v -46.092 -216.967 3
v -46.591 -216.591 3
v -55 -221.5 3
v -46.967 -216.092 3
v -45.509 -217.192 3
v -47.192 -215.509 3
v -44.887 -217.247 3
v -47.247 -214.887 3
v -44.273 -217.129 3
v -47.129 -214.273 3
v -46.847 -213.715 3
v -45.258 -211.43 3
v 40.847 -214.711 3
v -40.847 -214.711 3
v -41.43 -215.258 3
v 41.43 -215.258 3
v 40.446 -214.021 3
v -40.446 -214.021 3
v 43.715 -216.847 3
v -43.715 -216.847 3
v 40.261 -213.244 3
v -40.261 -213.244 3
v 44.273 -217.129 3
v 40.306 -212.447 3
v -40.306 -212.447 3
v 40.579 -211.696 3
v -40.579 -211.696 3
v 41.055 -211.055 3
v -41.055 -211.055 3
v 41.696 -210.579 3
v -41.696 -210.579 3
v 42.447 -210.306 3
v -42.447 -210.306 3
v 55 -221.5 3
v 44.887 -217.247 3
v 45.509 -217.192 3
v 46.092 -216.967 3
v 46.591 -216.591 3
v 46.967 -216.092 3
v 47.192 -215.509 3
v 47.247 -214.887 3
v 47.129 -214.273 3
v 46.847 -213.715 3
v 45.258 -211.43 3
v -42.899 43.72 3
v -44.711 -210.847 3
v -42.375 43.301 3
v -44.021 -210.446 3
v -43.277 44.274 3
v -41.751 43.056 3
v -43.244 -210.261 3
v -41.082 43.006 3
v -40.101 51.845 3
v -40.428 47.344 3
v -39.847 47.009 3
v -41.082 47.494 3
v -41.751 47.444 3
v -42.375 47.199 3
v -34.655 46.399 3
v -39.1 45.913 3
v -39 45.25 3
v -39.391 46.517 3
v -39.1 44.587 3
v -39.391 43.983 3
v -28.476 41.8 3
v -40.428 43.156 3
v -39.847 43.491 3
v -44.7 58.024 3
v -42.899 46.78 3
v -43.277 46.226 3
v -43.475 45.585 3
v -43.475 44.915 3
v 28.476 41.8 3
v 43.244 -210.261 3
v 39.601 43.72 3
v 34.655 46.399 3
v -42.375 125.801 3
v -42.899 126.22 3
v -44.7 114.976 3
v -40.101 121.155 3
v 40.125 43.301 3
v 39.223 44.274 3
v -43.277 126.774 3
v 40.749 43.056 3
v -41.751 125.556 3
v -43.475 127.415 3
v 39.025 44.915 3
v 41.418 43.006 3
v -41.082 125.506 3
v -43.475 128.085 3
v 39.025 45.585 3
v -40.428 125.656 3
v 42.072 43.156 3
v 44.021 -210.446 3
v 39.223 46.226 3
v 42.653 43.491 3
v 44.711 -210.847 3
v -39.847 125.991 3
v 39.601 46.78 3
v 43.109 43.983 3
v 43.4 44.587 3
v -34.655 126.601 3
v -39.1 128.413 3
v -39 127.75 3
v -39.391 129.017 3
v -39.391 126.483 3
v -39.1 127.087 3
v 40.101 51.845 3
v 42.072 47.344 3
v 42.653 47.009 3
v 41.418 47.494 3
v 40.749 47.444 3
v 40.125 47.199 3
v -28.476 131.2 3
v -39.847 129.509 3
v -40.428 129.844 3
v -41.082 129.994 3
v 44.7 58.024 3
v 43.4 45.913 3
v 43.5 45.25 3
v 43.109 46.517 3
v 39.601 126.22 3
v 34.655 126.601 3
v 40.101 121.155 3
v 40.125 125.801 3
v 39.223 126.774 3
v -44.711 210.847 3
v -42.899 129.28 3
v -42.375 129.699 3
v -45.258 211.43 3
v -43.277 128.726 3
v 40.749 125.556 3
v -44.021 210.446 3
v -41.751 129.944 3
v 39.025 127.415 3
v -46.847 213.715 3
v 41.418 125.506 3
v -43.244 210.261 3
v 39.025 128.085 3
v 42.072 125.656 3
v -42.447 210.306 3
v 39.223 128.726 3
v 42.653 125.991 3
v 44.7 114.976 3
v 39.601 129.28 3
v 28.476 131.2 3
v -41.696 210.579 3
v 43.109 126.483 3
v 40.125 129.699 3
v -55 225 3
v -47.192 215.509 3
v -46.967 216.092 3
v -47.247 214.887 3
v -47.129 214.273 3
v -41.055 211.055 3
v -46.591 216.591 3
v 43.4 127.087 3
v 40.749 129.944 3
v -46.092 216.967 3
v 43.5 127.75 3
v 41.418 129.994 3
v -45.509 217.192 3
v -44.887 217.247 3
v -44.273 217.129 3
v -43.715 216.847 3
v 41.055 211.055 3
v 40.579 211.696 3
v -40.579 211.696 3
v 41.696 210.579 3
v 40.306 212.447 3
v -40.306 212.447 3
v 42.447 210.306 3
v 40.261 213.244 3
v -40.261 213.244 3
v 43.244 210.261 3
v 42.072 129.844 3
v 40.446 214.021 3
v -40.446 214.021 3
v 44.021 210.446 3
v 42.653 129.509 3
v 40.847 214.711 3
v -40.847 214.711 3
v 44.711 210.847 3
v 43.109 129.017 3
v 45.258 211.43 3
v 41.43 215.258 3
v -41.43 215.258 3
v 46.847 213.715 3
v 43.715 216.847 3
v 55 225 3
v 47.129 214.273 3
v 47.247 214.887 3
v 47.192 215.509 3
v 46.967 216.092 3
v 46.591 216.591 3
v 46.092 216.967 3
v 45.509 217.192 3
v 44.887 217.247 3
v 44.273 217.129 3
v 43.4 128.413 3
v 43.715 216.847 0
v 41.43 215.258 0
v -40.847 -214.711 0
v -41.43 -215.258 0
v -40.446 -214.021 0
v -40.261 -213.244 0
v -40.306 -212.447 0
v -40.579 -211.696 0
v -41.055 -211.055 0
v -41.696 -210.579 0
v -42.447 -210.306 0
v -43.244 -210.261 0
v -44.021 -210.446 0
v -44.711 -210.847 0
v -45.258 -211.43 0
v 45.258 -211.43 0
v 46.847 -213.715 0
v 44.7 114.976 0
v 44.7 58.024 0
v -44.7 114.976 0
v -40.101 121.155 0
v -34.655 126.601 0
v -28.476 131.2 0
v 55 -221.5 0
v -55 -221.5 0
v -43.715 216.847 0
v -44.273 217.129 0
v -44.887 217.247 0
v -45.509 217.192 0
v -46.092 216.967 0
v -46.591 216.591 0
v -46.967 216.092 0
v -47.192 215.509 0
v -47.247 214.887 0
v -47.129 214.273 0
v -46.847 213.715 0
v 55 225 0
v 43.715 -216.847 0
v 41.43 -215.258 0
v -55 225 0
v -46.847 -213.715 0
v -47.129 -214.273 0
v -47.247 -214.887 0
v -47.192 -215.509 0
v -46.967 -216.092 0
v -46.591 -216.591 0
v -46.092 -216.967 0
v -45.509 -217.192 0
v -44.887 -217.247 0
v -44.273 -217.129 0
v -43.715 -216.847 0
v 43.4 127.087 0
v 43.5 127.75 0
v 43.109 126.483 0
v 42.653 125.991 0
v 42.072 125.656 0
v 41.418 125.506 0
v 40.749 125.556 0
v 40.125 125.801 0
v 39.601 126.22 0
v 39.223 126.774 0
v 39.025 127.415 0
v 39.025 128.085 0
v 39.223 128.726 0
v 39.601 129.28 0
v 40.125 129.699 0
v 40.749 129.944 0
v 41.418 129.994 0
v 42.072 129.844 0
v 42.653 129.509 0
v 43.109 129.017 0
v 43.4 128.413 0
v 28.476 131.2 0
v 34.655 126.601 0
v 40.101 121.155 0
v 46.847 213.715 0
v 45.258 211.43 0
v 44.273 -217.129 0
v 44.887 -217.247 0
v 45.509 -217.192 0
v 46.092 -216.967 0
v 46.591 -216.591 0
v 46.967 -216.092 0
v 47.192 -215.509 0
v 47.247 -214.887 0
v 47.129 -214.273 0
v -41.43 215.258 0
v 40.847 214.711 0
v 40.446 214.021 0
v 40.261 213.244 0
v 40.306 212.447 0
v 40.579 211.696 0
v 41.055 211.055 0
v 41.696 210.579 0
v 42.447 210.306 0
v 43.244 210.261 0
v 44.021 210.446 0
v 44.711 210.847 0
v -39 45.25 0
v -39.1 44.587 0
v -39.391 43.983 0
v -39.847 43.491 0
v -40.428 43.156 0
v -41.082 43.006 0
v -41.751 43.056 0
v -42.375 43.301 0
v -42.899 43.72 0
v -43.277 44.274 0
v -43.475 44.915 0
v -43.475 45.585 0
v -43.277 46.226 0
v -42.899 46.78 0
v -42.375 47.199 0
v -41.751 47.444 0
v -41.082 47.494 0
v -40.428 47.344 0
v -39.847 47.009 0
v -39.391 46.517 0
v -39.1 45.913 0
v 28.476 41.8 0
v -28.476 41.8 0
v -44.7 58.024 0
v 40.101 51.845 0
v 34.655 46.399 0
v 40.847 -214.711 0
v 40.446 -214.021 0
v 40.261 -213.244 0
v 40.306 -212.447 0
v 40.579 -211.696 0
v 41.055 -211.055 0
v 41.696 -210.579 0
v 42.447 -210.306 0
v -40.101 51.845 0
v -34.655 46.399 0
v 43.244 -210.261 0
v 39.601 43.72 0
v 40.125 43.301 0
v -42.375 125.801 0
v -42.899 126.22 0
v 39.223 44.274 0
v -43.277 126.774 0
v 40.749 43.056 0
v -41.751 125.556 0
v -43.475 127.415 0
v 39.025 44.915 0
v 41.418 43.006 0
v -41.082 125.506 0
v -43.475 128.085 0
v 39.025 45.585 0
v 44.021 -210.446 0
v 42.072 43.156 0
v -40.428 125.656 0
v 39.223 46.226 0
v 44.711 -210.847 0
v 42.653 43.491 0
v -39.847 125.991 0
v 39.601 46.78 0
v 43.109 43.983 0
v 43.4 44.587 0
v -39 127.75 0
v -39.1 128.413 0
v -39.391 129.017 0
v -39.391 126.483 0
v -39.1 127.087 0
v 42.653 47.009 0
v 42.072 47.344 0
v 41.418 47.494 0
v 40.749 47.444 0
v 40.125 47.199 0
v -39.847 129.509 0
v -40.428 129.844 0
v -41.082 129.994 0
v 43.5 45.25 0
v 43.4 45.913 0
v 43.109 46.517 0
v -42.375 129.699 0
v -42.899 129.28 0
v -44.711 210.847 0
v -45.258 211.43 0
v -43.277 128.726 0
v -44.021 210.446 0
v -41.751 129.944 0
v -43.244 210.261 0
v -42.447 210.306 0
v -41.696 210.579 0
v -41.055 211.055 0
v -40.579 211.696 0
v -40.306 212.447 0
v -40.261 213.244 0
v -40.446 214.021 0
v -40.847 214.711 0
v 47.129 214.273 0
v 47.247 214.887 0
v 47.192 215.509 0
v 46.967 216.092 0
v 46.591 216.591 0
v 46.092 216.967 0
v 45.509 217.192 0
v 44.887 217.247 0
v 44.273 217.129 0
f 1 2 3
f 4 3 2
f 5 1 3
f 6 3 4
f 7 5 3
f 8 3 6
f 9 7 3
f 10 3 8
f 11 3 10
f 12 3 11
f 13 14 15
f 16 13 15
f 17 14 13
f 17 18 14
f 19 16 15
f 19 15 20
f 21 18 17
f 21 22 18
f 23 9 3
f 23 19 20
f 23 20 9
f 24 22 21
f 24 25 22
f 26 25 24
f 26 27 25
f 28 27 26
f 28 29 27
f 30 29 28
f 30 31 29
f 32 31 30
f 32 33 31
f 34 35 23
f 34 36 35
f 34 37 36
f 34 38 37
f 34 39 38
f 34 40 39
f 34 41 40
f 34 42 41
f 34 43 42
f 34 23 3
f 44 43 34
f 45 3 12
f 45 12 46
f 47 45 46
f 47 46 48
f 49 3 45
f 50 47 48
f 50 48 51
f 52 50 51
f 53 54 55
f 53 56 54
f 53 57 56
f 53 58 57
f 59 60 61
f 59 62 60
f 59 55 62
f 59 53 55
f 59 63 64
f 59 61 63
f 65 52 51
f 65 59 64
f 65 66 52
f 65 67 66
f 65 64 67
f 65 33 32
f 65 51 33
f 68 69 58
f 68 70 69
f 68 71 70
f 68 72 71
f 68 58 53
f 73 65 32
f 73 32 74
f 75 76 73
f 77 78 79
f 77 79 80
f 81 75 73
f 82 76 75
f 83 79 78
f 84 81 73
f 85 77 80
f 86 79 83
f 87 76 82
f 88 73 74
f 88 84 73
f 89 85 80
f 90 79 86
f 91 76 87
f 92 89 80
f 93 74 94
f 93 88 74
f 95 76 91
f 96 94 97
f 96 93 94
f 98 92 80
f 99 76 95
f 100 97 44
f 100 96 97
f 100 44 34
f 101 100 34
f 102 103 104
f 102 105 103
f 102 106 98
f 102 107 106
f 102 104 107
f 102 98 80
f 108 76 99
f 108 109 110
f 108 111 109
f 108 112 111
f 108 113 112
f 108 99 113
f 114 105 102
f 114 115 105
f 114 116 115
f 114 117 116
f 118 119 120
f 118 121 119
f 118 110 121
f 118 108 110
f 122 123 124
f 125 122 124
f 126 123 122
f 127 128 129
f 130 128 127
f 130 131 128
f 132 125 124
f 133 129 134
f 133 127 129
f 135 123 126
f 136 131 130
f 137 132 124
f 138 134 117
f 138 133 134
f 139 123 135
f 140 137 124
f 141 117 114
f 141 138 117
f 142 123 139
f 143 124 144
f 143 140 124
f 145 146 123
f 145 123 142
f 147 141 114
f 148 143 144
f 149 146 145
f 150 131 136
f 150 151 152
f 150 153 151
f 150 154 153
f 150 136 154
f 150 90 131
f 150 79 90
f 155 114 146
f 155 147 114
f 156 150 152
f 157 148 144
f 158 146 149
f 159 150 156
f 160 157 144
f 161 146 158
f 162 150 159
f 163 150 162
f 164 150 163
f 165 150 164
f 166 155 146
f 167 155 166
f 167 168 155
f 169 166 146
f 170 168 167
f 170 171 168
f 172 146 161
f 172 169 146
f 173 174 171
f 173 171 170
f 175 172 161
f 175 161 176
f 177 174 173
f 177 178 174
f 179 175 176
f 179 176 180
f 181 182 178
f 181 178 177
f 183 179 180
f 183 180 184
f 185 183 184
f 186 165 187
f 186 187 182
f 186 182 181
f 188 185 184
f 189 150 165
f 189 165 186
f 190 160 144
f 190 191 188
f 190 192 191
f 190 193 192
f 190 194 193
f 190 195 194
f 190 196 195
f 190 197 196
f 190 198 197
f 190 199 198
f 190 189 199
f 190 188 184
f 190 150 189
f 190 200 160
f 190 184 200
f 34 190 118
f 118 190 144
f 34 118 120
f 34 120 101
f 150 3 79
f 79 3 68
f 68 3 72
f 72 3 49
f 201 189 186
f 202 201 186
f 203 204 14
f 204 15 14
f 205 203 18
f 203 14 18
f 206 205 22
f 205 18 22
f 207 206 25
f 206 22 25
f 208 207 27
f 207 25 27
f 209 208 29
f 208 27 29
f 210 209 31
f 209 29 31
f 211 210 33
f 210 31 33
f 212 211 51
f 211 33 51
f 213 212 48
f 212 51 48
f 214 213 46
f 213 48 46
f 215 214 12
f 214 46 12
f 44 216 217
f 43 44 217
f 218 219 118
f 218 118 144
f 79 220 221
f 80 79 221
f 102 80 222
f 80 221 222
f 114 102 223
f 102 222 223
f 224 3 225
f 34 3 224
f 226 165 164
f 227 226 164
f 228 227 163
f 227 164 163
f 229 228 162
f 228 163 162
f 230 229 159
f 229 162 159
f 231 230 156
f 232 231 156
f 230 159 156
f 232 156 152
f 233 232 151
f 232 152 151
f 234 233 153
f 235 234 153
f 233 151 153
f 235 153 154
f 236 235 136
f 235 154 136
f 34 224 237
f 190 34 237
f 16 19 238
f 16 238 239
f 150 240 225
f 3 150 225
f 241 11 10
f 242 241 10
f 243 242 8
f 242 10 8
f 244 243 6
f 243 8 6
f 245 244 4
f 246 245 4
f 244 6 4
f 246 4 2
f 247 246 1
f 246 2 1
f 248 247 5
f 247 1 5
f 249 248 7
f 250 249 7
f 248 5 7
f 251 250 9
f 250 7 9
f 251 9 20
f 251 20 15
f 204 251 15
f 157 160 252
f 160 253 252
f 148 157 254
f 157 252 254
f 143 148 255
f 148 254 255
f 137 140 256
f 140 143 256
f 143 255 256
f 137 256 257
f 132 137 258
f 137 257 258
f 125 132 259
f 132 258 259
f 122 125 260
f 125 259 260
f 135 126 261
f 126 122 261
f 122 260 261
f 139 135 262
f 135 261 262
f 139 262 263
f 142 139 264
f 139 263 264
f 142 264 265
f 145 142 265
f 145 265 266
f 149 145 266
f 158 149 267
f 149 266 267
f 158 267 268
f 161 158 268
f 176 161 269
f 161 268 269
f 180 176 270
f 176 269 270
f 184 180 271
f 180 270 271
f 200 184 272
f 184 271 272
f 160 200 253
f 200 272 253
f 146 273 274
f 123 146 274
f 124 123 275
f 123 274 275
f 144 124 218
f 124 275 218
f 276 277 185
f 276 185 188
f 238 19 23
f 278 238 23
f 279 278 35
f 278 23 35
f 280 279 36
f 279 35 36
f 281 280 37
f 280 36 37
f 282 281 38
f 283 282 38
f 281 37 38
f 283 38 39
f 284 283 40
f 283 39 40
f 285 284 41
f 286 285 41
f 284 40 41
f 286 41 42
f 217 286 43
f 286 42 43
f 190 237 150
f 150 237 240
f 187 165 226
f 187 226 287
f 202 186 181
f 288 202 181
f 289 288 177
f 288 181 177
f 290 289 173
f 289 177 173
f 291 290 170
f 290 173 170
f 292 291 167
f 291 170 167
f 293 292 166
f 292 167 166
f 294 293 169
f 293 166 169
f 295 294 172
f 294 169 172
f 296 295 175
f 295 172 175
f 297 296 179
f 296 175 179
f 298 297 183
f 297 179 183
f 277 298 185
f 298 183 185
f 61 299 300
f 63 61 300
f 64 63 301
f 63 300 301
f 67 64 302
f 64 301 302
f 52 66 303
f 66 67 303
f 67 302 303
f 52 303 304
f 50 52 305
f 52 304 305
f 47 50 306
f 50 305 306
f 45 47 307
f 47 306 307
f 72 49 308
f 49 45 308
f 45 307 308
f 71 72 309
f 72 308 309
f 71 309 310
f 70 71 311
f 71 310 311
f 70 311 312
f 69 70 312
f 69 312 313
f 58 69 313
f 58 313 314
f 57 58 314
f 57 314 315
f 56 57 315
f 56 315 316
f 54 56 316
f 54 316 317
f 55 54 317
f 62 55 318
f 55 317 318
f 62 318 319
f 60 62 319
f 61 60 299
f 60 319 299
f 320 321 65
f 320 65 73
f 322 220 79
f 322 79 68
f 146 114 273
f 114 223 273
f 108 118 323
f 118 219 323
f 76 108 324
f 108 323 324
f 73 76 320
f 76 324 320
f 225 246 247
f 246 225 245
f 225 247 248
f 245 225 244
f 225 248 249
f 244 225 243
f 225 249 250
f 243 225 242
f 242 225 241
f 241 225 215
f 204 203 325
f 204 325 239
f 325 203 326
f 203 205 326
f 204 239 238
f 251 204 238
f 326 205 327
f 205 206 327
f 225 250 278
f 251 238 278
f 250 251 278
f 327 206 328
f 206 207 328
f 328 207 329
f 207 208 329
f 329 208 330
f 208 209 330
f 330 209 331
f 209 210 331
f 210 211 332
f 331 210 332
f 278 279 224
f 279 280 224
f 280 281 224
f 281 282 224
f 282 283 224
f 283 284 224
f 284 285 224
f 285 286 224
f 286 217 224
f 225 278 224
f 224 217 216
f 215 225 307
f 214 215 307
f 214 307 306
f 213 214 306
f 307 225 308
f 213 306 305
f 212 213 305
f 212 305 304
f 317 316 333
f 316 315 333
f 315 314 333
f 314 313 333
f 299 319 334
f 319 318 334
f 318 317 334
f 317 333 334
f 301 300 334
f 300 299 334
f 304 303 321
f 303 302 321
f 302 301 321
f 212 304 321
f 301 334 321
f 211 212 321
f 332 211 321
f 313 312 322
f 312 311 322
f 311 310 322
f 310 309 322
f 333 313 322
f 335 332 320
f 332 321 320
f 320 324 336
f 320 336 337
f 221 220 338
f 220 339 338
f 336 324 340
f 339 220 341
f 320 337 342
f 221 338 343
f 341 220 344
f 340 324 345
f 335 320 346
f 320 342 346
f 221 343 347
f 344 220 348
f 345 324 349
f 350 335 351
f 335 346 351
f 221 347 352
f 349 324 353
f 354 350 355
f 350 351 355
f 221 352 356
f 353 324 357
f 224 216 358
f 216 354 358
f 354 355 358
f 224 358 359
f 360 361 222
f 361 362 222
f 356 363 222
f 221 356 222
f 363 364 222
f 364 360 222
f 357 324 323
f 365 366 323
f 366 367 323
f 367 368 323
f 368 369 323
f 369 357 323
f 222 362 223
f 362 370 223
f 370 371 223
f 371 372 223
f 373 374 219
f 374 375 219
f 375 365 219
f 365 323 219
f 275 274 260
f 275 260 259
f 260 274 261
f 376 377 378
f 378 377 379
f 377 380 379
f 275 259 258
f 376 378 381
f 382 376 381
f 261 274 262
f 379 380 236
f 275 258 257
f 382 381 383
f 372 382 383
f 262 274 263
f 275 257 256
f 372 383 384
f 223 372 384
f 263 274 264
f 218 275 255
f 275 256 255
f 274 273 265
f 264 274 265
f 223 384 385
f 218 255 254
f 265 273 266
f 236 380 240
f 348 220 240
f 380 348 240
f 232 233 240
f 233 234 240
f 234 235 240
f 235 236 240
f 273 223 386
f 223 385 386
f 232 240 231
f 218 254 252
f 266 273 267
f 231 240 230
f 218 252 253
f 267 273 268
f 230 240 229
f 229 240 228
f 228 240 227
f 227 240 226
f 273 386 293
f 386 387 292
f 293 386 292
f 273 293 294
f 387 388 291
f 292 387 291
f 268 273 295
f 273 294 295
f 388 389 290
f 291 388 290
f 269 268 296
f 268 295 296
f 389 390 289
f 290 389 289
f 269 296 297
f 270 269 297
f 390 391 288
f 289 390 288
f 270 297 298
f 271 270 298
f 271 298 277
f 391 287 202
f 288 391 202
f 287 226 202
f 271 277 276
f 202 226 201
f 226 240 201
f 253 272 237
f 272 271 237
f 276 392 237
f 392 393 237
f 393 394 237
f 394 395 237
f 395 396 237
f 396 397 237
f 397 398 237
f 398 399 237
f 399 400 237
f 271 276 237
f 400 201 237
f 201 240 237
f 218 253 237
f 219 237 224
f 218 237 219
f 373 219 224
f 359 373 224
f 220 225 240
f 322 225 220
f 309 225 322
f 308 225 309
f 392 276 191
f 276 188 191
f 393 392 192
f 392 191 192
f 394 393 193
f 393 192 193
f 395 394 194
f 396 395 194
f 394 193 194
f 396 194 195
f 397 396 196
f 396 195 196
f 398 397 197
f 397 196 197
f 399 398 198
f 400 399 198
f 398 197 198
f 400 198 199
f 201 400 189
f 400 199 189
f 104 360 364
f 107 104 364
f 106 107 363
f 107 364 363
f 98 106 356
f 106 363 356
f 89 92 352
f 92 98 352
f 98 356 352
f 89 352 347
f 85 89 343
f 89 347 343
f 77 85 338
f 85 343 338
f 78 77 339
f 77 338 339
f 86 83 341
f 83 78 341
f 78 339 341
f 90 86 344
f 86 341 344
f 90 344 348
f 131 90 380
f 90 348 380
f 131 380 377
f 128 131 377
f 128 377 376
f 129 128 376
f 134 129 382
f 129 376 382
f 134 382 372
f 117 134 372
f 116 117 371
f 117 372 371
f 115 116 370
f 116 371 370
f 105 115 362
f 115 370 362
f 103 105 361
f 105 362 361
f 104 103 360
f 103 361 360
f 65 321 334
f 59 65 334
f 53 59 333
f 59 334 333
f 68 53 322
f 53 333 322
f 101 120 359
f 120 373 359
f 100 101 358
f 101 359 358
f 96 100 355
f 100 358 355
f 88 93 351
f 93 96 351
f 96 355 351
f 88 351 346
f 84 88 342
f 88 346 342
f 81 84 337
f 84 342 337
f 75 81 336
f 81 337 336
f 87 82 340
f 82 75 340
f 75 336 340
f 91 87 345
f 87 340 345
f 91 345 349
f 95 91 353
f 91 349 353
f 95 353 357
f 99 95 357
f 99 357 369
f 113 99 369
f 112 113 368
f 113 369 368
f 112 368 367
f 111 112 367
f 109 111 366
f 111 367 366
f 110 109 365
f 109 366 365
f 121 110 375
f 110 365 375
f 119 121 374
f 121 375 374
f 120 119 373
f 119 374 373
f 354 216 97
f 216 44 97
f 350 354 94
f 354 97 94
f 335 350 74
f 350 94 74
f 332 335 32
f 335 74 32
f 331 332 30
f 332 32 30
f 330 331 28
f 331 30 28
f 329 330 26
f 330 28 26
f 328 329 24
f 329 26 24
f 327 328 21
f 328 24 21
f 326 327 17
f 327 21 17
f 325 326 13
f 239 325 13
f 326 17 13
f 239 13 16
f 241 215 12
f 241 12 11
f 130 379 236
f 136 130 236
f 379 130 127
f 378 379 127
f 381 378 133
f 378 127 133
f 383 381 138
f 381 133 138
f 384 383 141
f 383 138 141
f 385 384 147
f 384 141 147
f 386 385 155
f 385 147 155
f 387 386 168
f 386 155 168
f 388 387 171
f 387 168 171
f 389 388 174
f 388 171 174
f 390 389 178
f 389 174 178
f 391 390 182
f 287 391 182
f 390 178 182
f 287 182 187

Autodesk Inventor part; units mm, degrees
ref_plane "YZ Plane" through (0, 0, 0) normal (1, 0, 0) x (0, 1, 0)
ref_plane "XZ Plane" through (0, 0, 0) normal (0, 1, 0) x (-1, 0, 0)
ref_plane "XY Plane" through (0, 0, 0) normal (0, 0, 1) x (1, 0, 0)
sketch "スケッチ1" plane through (0, 0, 0) normal (0, 0, 1) x (1, 0, 0)
  line L0 (-55, -225) -> (55, -225)
  line L1 (55, -225) -> (55, 225)
  line L2 (55, 225) -> (-55, 225)
  line L3 (-55, 225) -> (-55, -225)
  line L4 (-55, -225) -> (55, 225) construction
  line L5 (55, -225) -> (-55, 225) construction
  line L6 (-55, 195) -> (-50, 195) construction
  line L7 (-50, 195) -> (-25, 220) construction
  line L8 (-25, 220) -> (-25, 225) construction
  line L9 (-46, 40.5) -> (46, 40.5) construction
  line L10 (46, 40.5) -> (46, 132.5) construction
  line L11 (46, 132.5) -> (-46, 132.5) construction
  line L12 (-46, 132.5) -> (-46, 40.5) construction
  line L13 (-46, 40.5) -> (46, 132.5) construction
  line L14 (46, 40.5) -> (-46, 132.5) construction
  line L15 (-46, 1.5) -> (46, 1.5) construction
  line L16 (46, 1.5) -> (46, 37.5) construction
  line L17 (46, 37.5) -> (-46, 37.5) construction
  line L18 (-46, 37.5) -> (-46, 1.5) construction
  line L19 (-46, 1.5) -> (46, 37.5) construction
  line L20 (46, 1.5) -> (-46, 37.5) construction
  line L21 (0, 0) -> (0, 86.5) construction
  circle A0 centre (0, 86.5) radius 53 construction
  line L22 (-44.7, 41.8) -> (44.7, 41.8) construction
  line L23 (44.7, 41.8) -> (44.7, 131.2) construction
  line L24 (44.7, 131.2) -> (-44.7, 131.2) construction
  line L25 (-44.7, 131.2) -> (-44.7, 41.8) construction
  line L26 (-44.7, 41.8) -> (44.7, 131.2) construction
  line L27 (44.7, 41.8) -> (-44.7, 131.2) construction
  arc A1 (-28.4765, 131.2) -> (-44.7, 114.9765) centre (0, 86.5) ccw
  arc A2 (-44.7, 58.0235) -> (-28.4765, 41.8) centre (0, 86.5) ccw
  arc A3 (28.4765, 41.8) -> (44.7, 58.0235) centre (0, 86.5) ccw
  arc A4 (44.7, 114.9765) -> (28.4765, 131.2) centre (0, 86.5) ccw
  line L28 (-28.4765, 131.2) -> (28.4765, 131.2)
  line L29 (-44.7, 114.9765) -> (-44.7, 58.0235)
  line L30 (-28.4765, 41.8) -> (28.4765, 41.8)
  line L31 (44.7, 58.0235) -> (44.7, 114.9765)
  line L32 (-41.25, 45.25) -> (41.25, 45.25) construction
  line L33 (41.25, 45.25) -> (41.25, 127.75) construction
  line L34 (41.25, 127.75) -> (-41.25, 127.75) construction
  line L35 (-41.25, 127.75) -> (-41.25, 45.25) construction
  line L36 (-41.25, 45.25) -> (41.25, 127.75) construction
  line L37 (41.25, 45.25) -> (-41.25, 127.75) construction
  circle A5 centre (-41.25, 127.75) radius 2.25
  circle A6 centre (-41.25, 45.25) radius 2.25
  circle A7 centre (41.25, 45.25) radius 2.25
  circle A8 centre (41.25, 127.75) radius 2.25
  circle A9 centre (-45, 215) radius 2.25
  circle A10 centre (45, 215) radius 2.25
  circle A11 centre (45, -215) radius 2.25
  circle A12 centre (-45, -215) radius 2.25
  circle A13 centre (-45, 0) radius 2.25 construction
  circle A14 centre (45, 0) radius 2.25 construction
  line L38 (-55, 0) -> (55, 0) construction
  circle A15 centre (-41.25, -49.75) radius 2.25
  arc A16 (-44.7, -36.9765) -> (-28.4765, -53.2) centre (0, -8.5) ccw
  line L39 (-28.4765, -53.2) -> (28.4765, -53.2)
  arc A17 (28.4765, -53.2) -> (44.7, -36.9765) centre (0, -8.5) ccw
  circle A18 centre (41.25, -49.75) radius 2.25
  line L40 (44.7, -36.9765) -> (44.7, 19.9765)
  circle A19 centre (41.25, 32.75) radius 2.25
  arc A20 (44.7, 19.9765) -> (28.4765, 36.2) centre (0, -8.5) ccw
  line L41 (-28.4765, 36.2) -> (28.4765, 36.2)
  circle A21 centre (-41.25, 32.75) radius 2.25
  arc A22 (-28.4765, 36.2) -> (-44.7, 19.9765) centre (0, -8.5) ccw
  line L42 (-44.7, 19.9765) -> (-44.7, -36.9765)
  circle A23 centre (-41.25, -144.75) radius 2.25
  arc A24 (-44.7, -131.9765) -> (-28.4765, -148.2) centre (0, -103.5) ccw
  line L43 (-28.4765, -148.2) -> (28.4765, -148.2)
  arc A25 (28.4765, -148.2) -> (44.7, -131.9765) centre (0, -103.5) ccw
  circle A26 centre (41.25, -144.75) radius 2.25
  line L44 (44.7, -131.9765) -> (44.7, -75.0235)
  circle A27 centre (41.25, -62.25) radius 2.25
  arc A28 (44.7, -75.0235) -> (28.4765, -58.8) centre (0, -103.5) ccw
  line L45 (-28.4765, -58.8) -> (28.4765, -58.8)
  circle A29 centre (-41.25, -62.25) radius 2.25
  arc A30 (-28.4765, -58.8) -> (-44.7, -75.0235) centre (0, -103.5) ccw
  line L46 (-44.7, -75.0235) -> (-44.7, -131.9765)
  point P0 (0, 19.5)
  point P1 (0, 19.5)
  dimension "d12" = 106
  dimension "d0" = 110
  dimension "d1" = 450
  dimension "d2" = 135
  dimension "d3" = 30
  dimension "d4" = 30
  dimension "d5" = 5
  dimension "d6" = 92
  dimension "d7" = 92
  dimension "d8" = 92
  dimension "d9" = 36
  dimension "d10" = 3
  dimension "d11" = 1.5
  dimension "d13" = 89.4
  dimension "d14" = 89.4
  dimension "d15" = 82.5
  dimension "d16" = 82.5
  dimension "d17" = 4.5
  dimension "d25" = 4.5
  dimension "d26" = 10
  dimension "d27" = 10
  dimension "d28" = 10
  dimension "d29" = 10
  dimension "d30" = 10
  dimension "d31" = 10
  dimension "d32" = 10
  dimension "d33" = 10
  dimension "d34" = 10
  dimension "d35" = 10
  dimension "d45" = 95
extrude "押し出し1" add sketch "スケッチ1" along normal blind 3 contours L3 L2 L1 L0 | A15 | L42 A22 L41 A20 L40 A17 L39 A16 | A18 | A19 | A21 | A23 | L46 A30 L45 A28 L44 A25 L43 A24 | A26 | A27 | A29
sketch "スケッチ2" plane through (0, 0, 3) normal (0, 0, 1) x (1, 0, 0)
  circle A0 centre (-45, 215) radius 2.25 construction
  circle A1 centre (45, -215) radius 2.25 construction
  circle A2 centre (-45, -215) radius 2.25 construction
  circle A3 centre (-43, 213) radius 2.75 construction
  line L0 (55, 225) -> (-55, 225) projected
  line L1 (-55, 225) -> (-55, -225) projected
  line L2 (-43.7153, 216.8472) -> (-41.4298, 215.2577)
  line L3 (-45.2577, 211.4298) -> (-46.8472, 213.7153)
  circle A4 centre (-45, 215) radius 2.25 construction
  arc A5 (-43.7153, 216.8472) -> (-46.8472, 213.7153) centre (-45, 215) ccw
  arc A6 (-45.2577, 211.4298) -> (-41.4298, 215.2577) centre (-43, 213) ccw
  line L4 (55, 225) -> (-55, 225) construction
  line L5 (0, 225) -> (0, -225) construction
  line L6 (-55, -225) -> (55, -225) construction
  line L7 (-55, 0) -> (55, 0) construction
  line L8 (55, -225) -> (55, 225) construction
  circle A7 centre (45, 215) radius 2.25 construction
  circle A8 centre (43, 213) radius 2.75 construction
  line L9 (43.7153, 216.8472) -> (41.4298, 215.2577)
  line L10 (45.2577, 211.4298) -> (46.8472, 213.7153)
  circle A9 centre (45, 215) radius 2.25 construction
  arc A10 (46.8472, 213.7153) -> (43.7153, 216.8472) centre (45, 215) ccw
  arc A11 (41.4298, 215.2577) -> (45.2577, 211.4298) centre (43, 213) ccw
  circle A12 centre (-45, -215) radius 2.25 construction
  circle A13 centre (-43, -213) radius 2.75 construction
  line L11 (-43.7153, -216.8472) -> (-41.4298, -215.2577)
  line L12 (-45.2577, -211.4298) -> (-46.8472, -213.7153)
  circle A14 centre (-45, -215) radius 2.25 construction
  arc A15 (-46.8472, -213.7153) -> (-43.7153, -216.8472) centre (-45, -215) ccw
  arc A16 (-41.4298, -215.2577) -> (-45.2577, -211.4298) centre (-43, -213) ccw
  circle A17 centre (45, -215) radius 2.25 construction
  line L13 (45.2577, -211.4298) -> (46.8472, -213.7153)
  arc A18 (45.2577, -211.4298) -> (41.4298, -215.2577) centre (43, -213) ccw
  circle A19 centre (43, -213) radius 2.75 construction
  line L14 (43.7153, -216.8472) -> (41.4298, -215.2577)
  circle A20 centre (45, -215) radius 2.25 construction
  arc A21 (43.7153, -216.8472) -> (46.8472, -213.7153) centre (45, -215) ccw
  point P0 (0, 0)
  dimension "d38" = 5.5
  dimension "d39" = 12
  dimension "d40" = 12
extrude "押し出し2" cut sketch "スケッチ2" against normal through all
sketch "スケッチ3" plane through (0, 0, 3) normal (0, 0, 1) x (1, 0, 0)
  line L0 (-55, -225) -> (55, -225) construction
  line L1 (-55, -221.5) -> (55, -221.5)
  line L2 (55, -221.5) -> (55, -225)
  line L3 (55, -225) -> (-55, -225)
  line L4 (-55, -225) -> (-55, -221.5)
  line L5 (-55, -221.5) -> (55, -225) construction
  line L6 (55, -221.5) -> (-55, -225) construction
  line L7 (0, -223.25) -> (0, -225) construction
  point P0 (0, 0)
  dimension "d50" = 3.5
  dimension "d51" = 110
extrude "押し出し3" cut sketch "スケッチ3" against normal through all
sketch "スケッチ4" plane through (0, 0, 3) normal (0, 0, 1) x (1, 0, 0)
  line L0 (-55, -221.5) -> (55, -221.5) construction
  line L1 (55, -221.5) -> (55, 225) construction
  line L2 (55, 225) -> (-55, 225) construction
  line L3 (-55, 225) -> (-55, -221.5) construction
  circle A0 centre (-41.25, 127.75) radius 2.25 construction
  circle A1 centre (-41.25, 45.25) radius 2.25 construction
  circle A2 centre (41.25, 45.25) radius 2.25 construction
  circle A3 centre (41.25, 127.75) radius 2.25 construction
  line L4 (43.7153, -216.8472) -> (41.4298, -215.2577) construction
  arc A4 (45.2577, -211.4298) -> (41.4298, -215.2577) centre (43, -213) ccw construction
  line L5 (45.2577, -211.4298) -> (46.8472, -213.7153) construction
  arc A5 (43.7153, -216.8472) -> (46.8472, -213.7153) centre (45, -215) ccw construction
  line L6 (-28.4765, 131.2) -> (28.4765, 131.2) construction
  arc A6 (44.7, 114.9765) -> (28.4765, 131.2) centre (0, 86.5) ccw construction
  line L7 (44.7, 114.9765) -> (44.7, 58.0235) construction
  arc A7 (28.4765, 41.8) -> (44.7, 58.0235) centre (0, 86.5) ccw construction
  line L8 (28.4765, 41.8) -> (-28.4765, 41.8) construction
  arc A8 (-44.7, 58.0235) -> (-28.4765, 41.8) centre (0, 86.5) ccw construction
  line L9 (-44.7, 58.0235) -> (-44.7, 114.9765) construction
  arc A9 (-28.4765, 131.2) -> (-44.7, 114.9765) centre (0, 86.5) ccw construction
  line L10 (41.4298, 215.2577) -> (43.7153, 216.8472) construction
  arc A10 (46.8472, 213.7153) -> (43.7153, 216.8472) centre (45, 215) ccw construction
  line L11 (46.8472, 213.7153) -> (45.2577, 211.4298) construction
  arc A11 (41.4298, 215.2577) -> (45.2577, 211.4298) centre (43, 213) ccw construction
  line L12 (-45.2577, 211.4298) -> (-46.8472, 213.7153) construction
  arc A12 (-43.7153, 216.8472) -> (-46.8472, 213.7153) centre (-45, 215) ccw construction
  line L13 (-43.7153, 216.8472) -> (-41.4298, 215.2577) construction
  arc A13 (-45.2577, 211.4298) -> (-41.4298, 215.2577) centre (-43, 213) ccw construction
  line L14 (-41.4298, -215.2577) -> (-43.7153, -216.8472) construction
  arc A14 (-46.8472, -213.7153) -> (-43.7153, -216.8472) centre (-45, -215) ccw construction
  line L15 (-46.8472, -213.7153) -> (-45.2577, -211.4298) construction
  arc A15 (-41.4298, -215.2577) -> (-45.2577, -211.4298) centre (-43, -213) ccw construction
  line L16 (-54.75, -221.25) -> (54.75, -221.25)
  line L17 (54.75, -221.25) -> (54.75, 224.75)
  line L18 (54.75, 224.75) -> (-54.75, 224.75)
  line L19 (-54.75, 224.75) -> (-54.75, -221.25)
  point P0 (0, 0)
  dimension "d54" = 0.25
extrude "押し出し4" [suppressed]
equation "\"d4\" = d3"
equation "\"d11\" = 0.5 * d10"
equation "\"d27\" = d26"
equation "\"d28\" = d26"
equation "\"d29\" = d26"
equation "\"d30\" = d26"
equation "\"d31\" = d26"
equation "\"d32\" = d26"
equation "\"d33\" = d26"
equation "\"d34\" = d26"
equation "\"d35\" = d26"
equation "\"d45\" = d7 + d10"
properties part number "bottom_panel" material "アルミニウム 6061"
